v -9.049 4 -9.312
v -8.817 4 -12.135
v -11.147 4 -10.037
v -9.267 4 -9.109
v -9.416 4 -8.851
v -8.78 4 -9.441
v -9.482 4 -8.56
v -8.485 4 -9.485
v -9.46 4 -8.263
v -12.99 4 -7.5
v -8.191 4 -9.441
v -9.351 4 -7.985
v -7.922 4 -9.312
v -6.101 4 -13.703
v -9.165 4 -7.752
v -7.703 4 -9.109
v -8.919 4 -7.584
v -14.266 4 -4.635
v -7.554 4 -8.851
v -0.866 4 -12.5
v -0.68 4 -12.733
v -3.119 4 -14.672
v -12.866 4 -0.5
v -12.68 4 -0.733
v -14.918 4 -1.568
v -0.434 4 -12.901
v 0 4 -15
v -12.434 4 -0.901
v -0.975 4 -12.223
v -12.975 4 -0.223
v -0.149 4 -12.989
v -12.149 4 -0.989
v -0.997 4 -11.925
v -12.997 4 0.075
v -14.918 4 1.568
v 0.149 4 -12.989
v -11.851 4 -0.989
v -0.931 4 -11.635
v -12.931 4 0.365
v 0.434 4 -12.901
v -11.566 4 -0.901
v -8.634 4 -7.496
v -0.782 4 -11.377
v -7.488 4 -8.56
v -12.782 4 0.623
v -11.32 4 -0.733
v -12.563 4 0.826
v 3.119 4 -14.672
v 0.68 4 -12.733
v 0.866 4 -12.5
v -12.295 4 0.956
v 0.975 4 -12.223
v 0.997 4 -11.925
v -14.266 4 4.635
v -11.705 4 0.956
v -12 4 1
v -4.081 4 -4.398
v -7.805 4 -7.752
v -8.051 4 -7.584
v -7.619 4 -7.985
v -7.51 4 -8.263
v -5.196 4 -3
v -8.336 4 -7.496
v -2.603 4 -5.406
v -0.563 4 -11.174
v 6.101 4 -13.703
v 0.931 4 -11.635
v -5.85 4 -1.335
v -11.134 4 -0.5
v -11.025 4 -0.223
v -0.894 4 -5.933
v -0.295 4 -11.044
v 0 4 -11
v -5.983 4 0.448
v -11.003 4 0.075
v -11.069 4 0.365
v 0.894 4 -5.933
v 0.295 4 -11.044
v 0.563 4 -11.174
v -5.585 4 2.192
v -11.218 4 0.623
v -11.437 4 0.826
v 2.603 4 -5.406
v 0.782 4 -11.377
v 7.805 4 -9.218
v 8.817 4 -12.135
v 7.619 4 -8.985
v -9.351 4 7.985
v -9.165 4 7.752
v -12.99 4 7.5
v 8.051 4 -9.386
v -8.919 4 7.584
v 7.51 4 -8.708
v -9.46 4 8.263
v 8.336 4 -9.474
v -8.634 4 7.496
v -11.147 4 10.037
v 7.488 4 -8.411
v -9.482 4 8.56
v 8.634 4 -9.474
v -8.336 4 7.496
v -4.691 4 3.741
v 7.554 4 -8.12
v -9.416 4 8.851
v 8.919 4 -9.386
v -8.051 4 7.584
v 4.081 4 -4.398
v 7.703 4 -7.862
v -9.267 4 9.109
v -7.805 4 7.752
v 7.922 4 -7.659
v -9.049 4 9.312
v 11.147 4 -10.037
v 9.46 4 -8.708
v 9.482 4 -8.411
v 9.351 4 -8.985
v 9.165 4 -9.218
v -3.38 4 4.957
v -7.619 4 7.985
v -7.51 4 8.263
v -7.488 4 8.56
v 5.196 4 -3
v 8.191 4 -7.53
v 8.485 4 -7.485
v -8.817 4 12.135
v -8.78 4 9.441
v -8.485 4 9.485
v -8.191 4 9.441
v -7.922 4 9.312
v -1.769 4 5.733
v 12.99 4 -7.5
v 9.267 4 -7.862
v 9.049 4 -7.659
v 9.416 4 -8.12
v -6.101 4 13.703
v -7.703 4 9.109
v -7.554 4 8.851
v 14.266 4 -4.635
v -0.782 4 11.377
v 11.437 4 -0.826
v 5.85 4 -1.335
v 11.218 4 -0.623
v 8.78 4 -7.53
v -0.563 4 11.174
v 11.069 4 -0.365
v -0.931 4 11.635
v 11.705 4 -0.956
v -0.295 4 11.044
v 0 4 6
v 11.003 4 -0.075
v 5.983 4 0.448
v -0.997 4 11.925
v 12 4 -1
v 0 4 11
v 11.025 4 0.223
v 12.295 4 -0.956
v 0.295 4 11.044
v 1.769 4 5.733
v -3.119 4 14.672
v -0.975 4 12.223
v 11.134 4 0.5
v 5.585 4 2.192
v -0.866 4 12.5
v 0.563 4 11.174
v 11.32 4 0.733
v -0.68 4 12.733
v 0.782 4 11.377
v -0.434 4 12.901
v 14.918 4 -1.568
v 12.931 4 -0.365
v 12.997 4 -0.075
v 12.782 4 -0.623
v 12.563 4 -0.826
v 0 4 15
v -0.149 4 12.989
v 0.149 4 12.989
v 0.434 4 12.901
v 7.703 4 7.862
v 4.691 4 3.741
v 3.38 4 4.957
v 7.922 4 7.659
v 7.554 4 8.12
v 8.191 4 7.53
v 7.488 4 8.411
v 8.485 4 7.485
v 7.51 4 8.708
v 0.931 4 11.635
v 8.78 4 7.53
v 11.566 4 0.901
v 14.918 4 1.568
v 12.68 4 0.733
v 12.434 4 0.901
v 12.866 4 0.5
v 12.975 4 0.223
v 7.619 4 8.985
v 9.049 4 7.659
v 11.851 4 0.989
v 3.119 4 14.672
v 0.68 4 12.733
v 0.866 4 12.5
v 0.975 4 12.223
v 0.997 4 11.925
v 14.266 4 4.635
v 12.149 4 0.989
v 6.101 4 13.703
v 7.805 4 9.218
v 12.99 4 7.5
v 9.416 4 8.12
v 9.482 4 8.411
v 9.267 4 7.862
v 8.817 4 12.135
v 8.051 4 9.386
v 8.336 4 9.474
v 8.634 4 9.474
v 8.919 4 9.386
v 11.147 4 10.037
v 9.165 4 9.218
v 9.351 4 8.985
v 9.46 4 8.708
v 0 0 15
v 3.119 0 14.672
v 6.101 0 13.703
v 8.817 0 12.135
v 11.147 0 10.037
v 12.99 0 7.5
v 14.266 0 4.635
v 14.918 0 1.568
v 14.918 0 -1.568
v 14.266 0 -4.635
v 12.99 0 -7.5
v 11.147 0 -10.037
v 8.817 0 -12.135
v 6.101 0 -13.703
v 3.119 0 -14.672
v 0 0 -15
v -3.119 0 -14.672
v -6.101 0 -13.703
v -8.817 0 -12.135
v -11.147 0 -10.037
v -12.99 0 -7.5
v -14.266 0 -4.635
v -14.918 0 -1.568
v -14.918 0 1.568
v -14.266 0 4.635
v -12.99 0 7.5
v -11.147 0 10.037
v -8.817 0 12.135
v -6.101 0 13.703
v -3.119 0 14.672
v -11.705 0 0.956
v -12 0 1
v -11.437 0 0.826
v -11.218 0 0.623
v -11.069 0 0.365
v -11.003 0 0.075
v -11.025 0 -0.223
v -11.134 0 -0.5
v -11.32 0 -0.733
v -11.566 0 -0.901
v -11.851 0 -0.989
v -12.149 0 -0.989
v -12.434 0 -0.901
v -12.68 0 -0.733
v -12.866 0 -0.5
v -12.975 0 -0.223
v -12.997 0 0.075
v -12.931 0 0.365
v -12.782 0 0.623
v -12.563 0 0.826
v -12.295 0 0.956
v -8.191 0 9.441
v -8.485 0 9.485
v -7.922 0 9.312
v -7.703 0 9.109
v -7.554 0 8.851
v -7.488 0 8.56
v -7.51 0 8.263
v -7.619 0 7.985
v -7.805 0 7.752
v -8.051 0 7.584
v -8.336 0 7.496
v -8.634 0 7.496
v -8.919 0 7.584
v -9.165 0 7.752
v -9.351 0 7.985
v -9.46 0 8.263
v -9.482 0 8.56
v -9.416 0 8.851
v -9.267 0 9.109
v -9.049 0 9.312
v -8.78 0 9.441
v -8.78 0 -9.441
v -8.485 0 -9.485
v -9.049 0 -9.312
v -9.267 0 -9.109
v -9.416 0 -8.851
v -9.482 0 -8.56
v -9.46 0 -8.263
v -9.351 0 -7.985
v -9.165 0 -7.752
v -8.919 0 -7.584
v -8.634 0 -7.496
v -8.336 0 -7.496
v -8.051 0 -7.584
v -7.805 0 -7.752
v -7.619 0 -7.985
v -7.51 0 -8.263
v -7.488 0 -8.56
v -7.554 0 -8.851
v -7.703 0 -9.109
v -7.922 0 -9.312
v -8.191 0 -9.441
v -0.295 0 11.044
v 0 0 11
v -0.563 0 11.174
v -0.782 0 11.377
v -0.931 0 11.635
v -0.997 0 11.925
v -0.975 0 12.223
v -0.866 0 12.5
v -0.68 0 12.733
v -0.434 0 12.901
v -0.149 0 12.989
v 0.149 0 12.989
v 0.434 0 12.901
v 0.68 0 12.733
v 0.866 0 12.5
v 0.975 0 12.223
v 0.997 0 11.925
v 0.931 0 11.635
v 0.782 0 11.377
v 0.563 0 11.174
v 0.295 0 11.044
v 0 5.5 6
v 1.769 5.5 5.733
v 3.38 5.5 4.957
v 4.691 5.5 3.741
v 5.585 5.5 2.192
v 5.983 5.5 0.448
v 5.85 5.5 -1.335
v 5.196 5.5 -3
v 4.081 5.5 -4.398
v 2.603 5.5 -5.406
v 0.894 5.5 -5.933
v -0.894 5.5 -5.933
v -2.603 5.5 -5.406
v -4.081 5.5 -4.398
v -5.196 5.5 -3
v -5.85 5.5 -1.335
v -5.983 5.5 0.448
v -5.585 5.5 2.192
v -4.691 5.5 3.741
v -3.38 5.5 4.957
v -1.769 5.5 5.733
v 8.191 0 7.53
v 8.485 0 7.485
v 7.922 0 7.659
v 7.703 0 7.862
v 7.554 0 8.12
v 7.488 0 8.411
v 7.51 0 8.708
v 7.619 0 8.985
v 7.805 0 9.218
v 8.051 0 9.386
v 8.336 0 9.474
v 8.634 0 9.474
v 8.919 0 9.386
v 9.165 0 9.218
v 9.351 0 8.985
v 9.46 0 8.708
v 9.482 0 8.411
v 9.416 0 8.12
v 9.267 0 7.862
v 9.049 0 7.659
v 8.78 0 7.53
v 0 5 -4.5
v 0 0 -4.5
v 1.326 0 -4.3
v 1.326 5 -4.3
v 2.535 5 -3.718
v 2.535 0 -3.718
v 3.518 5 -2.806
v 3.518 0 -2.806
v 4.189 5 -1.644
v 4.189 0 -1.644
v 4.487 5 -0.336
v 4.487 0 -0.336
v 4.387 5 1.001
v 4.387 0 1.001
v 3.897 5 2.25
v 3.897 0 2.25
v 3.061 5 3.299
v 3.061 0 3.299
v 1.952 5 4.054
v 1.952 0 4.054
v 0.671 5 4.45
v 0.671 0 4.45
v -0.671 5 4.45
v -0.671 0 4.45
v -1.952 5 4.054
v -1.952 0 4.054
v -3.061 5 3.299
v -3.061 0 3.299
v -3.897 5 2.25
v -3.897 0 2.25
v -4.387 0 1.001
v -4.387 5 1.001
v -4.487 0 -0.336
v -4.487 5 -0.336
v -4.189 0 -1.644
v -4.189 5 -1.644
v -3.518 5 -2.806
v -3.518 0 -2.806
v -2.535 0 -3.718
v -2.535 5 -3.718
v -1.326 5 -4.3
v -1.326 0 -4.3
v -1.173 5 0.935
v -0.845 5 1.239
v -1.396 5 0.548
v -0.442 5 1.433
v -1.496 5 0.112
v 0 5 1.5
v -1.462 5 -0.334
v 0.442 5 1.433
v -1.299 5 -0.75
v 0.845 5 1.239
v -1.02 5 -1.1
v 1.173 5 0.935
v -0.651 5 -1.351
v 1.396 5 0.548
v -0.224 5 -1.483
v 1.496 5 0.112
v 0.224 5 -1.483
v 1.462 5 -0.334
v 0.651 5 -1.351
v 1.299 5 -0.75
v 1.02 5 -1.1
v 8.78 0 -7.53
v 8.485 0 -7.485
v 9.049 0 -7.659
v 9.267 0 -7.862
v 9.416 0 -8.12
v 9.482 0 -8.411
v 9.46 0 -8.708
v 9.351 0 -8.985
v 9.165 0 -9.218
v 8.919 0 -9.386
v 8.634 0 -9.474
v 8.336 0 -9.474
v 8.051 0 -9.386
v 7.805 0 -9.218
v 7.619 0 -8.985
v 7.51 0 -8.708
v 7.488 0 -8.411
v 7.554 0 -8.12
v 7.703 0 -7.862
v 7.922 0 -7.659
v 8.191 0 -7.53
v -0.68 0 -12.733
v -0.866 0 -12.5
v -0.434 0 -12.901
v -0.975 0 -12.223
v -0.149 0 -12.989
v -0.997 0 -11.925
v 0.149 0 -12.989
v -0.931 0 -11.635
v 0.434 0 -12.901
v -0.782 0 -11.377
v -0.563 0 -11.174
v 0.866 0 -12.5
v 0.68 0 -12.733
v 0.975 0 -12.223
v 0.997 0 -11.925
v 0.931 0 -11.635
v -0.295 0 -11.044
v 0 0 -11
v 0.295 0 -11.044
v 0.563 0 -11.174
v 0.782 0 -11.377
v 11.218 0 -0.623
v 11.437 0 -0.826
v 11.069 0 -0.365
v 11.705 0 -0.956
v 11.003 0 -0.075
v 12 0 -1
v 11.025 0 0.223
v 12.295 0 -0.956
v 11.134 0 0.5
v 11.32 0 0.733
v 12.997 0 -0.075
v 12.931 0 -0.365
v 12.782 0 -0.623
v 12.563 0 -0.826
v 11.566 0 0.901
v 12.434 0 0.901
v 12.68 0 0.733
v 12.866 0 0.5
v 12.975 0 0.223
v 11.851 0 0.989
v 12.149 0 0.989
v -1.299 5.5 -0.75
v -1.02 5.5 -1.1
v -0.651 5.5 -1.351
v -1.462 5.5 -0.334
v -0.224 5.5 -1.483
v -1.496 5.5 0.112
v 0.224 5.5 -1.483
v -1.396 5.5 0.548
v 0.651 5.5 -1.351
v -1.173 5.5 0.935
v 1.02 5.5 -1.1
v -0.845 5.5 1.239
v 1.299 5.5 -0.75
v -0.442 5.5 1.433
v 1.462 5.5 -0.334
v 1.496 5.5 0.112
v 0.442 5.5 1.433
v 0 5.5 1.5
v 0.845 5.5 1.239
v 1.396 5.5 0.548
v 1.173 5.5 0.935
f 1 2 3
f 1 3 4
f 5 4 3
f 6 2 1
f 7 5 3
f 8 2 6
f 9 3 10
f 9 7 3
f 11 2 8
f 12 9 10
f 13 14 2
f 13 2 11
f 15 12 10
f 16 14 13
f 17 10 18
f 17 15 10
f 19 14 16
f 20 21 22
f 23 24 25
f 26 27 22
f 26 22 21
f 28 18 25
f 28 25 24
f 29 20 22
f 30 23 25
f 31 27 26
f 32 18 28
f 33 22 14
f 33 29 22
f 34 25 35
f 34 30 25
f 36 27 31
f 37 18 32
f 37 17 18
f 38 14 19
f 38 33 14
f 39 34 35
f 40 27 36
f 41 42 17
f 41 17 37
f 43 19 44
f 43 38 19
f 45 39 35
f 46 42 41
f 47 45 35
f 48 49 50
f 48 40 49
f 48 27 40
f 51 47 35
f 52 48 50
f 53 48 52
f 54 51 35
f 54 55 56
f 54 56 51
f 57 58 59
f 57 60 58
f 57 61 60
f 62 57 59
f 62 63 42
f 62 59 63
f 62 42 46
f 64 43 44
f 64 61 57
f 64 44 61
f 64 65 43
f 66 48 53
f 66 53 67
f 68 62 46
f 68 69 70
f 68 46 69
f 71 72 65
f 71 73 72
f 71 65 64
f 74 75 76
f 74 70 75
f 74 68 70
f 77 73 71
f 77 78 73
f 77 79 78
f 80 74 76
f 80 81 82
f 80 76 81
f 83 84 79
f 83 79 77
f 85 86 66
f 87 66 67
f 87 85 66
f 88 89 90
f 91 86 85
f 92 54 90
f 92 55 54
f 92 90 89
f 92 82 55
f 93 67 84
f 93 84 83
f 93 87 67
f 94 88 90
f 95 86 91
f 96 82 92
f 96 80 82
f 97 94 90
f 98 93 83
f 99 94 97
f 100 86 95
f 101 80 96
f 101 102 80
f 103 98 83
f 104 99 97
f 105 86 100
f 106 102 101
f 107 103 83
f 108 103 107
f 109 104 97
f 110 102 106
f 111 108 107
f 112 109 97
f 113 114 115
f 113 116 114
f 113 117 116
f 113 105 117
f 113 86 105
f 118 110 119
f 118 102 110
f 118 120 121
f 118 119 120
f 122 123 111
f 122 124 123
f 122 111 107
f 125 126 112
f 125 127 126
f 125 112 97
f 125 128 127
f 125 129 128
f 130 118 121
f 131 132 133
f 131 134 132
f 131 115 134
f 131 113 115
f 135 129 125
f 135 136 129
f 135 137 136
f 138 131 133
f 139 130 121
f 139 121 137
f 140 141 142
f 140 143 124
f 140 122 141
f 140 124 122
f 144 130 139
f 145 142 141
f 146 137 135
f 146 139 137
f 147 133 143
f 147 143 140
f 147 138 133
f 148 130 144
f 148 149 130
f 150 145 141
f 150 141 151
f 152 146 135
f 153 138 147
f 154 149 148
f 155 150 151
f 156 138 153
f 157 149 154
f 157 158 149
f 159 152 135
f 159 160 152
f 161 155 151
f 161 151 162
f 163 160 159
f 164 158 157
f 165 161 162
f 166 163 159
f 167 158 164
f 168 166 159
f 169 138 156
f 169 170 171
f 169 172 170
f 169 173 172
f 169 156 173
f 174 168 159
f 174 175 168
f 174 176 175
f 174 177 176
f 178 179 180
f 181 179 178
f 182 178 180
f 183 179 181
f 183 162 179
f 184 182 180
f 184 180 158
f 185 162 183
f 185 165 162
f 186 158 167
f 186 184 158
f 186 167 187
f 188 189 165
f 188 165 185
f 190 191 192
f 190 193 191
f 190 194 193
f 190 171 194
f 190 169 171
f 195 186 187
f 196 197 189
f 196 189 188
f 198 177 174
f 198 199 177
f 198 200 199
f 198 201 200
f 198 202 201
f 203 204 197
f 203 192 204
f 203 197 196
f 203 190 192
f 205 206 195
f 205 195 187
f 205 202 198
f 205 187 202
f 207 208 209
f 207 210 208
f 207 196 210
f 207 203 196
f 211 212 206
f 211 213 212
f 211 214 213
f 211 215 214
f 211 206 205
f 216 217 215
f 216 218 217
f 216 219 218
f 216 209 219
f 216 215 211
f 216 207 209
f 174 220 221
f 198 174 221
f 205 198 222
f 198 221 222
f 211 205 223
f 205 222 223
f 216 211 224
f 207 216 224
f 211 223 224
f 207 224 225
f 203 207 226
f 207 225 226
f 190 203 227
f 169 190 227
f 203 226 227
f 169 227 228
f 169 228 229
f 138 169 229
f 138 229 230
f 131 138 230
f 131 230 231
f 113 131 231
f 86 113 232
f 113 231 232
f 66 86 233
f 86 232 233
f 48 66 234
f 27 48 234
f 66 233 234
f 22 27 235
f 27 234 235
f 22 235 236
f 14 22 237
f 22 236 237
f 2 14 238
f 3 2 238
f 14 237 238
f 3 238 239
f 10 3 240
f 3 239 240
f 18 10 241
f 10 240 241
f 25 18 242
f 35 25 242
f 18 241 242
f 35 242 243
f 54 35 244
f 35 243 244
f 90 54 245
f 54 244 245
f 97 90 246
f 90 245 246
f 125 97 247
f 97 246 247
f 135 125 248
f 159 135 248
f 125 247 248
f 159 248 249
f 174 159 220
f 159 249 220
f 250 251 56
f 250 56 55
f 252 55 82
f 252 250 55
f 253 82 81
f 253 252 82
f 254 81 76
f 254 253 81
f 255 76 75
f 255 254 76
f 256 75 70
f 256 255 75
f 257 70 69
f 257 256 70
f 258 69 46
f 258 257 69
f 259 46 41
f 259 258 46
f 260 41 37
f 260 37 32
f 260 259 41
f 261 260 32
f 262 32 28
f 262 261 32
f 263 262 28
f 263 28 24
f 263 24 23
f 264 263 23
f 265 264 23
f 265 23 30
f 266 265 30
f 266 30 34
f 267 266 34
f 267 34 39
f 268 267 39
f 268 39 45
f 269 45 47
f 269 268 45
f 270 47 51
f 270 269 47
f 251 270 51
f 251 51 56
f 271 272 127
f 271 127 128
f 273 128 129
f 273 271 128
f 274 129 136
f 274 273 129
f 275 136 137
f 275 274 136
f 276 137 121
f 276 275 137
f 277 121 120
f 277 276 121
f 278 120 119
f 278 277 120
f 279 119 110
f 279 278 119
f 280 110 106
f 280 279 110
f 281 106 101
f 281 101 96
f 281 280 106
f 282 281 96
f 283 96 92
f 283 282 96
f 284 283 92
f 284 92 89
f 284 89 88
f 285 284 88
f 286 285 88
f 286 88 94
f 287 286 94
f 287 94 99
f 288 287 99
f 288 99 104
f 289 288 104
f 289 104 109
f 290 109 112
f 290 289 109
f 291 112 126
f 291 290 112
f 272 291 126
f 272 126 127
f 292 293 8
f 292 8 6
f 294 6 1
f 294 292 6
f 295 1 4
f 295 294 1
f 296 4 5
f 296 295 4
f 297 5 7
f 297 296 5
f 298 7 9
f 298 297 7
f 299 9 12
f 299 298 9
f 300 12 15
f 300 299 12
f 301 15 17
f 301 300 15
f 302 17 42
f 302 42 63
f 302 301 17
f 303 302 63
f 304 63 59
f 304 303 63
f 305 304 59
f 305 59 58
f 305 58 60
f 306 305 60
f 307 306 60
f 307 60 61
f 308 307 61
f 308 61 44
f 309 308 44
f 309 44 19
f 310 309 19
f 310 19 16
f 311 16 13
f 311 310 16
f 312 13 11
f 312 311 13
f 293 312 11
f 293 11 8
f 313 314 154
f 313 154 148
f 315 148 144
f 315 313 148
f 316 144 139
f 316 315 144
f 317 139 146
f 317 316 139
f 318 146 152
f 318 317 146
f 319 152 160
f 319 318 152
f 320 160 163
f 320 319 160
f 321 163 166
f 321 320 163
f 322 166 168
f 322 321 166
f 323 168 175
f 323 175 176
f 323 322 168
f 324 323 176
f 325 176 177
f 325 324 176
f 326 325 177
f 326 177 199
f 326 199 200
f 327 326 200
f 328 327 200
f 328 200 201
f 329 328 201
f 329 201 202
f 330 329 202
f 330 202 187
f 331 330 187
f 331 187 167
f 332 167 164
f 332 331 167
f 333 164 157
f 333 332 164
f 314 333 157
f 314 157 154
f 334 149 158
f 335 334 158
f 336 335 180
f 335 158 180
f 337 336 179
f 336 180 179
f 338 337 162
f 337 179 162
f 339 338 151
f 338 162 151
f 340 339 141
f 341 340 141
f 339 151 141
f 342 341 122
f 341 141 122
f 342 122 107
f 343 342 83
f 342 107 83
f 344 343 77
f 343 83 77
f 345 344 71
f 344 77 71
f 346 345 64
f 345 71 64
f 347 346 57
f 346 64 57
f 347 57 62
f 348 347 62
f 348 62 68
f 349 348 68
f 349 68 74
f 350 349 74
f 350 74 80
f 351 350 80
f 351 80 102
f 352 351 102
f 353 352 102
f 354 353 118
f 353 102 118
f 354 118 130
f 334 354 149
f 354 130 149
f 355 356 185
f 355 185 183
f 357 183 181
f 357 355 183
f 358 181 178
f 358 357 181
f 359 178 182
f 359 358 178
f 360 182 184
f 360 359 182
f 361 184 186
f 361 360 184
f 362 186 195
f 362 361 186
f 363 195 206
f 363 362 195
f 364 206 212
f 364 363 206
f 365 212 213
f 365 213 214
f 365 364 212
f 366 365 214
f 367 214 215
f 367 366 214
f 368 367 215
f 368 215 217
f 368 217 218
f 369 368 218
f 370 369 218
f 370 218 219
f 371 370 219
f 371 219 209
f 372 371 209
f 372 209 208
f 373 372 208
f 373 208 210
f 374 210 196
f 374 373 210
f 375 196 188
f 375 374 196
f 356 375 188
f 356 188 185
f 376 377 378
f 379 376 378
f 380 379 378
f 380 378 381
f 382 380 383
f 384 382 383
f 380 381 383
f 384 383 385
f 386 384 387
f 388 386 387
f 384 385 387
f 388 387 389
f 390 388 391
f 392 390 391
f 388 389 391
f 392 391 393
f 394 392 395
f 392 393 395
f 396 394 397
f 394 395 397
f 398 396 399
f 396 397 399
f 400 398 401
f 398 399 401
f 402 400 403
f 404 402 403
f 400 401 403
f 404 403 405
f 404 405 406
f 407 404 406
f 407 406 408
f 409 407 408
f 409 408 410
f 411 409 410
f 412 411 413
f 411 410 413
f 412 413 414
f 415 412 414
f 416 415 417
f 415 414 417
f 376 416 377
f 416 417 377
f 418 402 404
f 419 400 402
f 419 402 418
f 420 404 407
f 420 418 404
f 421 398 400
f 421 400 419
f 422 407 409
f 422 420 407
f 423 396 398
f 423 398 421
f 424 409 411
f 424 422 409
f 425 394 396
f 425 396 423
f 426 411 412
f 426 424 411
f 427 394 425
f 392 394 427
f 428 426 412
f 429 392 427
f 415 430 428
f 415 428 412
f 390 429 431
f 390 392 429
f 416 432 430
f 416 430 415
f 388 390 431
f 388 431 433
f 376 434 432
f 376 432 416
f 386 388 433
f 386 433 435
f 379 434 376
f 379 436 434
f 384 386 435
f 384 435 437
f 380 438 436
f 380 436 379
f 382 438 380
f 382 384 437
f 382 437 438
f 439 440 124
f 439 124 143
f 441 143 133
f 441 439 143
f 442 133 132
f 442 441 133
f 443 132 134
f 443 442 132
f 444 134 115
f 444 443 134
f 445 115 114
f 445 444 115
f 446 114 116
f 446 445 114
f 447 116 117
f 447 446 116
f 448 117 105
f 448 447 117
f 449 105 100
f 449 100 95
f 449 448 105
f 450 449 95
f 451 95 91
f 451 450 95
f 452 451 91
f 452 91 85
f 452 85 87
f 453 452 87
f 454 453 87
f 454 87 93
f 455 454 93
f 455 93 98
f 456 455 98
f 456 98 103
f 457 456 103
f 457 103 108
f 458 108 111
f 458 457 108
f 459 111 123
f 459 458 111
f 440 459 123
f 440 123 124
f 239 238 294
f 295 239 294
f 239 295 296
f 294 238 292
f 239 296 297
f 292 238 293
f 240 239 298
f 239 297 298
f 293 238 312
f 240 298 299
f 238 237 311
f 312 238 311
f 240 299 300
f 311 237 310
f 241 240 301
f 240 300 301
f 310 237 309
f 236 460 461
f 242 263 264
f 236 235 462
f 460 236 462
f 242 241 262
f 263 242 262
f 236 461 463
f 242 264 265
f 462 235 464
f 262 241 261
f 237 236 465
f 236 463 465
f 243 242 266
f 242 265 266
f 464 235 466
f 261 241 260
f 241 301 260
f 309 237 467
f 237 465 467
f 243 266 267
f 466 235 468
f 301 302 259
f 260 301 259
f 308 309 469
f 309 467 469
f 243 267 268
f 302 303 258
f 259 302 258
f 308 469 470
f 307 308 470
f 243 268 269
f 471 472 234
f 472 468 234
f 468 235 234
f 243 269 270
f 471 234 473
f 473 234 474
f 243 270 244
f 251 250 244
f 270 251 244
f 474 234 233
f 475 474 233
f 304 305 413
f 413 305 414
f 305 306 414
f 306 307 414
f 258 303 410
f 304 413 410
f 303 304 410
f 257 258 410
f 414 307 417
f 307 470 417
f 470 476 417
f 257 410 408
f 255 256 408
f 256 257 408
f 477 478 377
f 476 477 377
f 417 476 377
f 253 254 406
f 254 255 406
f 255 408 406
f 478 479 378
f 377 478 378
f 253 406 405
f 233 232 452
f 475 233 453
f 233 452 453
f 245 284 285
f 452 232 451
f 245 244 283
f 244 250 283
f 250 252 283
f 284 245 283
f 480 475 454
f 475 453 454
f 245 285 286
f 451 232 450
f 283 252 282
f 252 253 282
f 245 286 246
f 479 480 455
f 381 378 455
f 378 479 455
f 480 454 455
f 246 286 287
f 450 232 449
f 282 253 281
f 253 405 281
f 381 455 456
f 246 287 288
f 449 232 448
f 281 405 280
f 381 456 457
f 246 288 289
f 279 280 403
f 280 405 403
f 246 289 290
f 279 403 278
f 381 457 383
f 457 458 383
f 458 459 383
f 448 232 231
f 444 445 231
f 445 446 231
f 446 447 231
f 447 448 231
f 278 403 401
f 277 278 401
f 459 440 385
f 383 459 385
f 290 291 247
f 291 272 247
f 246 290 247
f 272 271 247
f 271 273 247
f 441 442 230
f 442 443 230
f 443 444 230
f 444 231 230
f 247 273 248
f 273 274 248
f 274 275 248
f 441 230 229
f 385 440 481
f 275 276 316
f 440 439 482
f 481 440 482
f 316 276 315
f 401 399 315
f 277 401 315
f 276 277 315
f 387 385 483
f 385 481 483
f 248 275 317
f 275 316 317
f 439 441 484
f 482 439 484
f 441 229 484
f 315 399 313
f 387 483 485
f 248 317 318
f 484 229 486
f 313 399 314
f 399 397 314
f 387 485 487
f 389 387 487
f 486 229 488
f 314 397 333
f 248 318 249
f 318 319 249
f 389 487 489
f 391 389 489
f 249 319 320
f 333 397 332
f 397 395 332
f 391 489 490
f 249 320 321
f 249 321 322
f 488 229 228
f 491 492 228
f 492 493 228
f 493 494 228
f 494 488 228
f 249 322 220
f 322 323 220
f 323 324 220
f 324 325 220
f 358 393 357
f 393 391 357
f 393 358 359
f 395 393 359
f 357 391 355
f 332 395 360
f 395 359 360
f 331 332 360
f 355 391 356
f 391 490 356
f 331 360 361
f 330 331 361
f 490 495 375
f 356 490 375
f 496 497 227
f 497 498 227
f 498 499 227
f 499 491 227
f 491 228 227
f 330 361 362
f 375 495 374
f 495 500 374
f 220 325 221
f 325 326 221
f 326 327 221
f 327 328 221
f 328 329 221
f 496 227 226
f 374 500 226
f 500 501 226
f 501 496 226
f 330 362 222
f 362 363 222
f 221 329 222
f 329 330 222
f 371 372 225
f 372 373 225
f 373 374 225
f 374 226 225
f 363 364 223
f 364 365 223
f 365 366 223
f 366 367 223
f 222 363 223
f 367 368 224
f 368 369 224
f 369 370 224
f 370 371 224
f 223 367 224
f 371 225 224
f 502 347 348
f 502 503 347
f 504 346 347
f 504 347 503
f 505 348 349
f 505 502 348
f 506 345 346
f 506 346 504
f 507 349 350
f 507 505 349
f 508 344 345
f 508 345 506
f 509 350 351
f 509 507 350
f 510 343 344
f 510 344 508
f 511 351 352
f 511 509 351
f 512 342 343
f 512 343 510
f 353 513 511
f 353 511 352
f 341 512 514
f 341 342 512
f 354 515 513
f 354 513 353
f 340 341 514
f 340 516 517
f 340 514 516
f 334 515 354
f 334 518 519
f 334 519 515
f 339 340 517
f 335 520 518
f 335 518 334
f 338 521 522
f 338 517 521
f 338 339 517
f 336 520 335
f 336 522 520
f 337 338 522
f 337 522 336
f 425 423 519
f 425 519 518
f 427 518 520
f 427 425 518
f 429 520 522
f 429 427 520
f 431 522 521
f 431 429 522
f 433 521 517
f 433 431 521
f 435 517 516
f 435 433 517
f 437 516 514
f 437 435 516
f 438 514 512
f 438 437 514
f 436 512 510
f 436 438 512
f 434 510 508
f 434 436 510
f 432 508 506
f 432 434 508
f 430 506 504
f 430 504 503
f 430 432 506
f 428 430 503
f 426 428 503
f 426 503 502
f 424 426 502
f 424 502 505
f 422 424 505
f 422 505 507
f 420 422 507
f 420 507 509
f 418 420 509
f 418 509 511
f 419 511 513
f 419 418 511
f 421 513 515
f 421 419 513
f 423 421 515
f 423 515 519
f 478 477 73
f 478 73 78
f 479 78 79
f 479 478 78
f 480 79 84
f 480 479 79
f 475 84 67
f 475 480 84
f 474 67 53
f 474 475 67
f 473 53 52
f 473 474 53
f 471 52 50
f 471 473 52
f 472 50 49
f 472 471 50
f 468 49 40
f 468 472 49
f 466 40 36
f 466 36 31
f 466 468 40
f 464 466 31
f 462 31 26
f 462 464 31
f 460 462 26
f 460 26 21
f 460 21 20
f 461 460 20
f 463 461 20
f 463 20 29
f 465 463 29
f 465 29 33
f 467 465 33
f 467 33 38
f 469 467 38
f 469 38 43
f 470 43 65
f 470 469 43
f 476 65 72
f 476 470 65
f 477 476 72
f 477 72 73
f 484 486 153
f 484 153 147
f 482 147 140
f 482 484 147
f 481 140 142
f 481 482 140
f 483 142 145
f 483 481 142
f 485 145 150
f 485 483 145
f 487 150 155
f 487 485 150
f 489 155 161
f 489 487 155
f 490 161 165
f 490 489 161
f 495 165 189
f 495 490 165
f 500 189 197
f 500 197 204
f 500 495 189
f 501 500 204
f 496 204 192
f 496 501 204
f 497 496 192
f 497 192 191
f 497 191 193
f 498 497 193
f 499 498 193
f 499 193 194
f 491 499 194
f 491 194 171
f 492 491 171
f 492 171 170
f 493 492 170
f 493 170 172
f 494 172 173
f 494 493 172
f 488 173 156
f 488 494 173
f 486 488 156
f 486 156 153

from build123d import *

# Parameters (mm, degrees)
SKETCH_1_R          = 15
SKETCH_1_R_2        = 1
SKETCH_1_R_3        = 1.5
EXTRUDE_1_DEPTH     = 4
SKETCH_2_R          = 6
SKETCH_2_R_2        = 1.5
EXTRUDE_2_DEPTH     = 1.5
SKETCH_3_R          = 4.5
CUT_EXTRUDE_1_DEPTH = 5


with BuildPart() as part:
    # 草图1 → 凸台-拉伸1 (new body)
    with BuildSketch(Plane(origin=(0, 0, 0), x_dir=(1, 0, 0), z_dir=(0, 1, 0))):
        with Locations(Location((0, 0, 0), (0, 0, 270))):
            Circle(SKETCH_1_R)
        with Locations(Location((0, 12, 0), (0, 0, 270))):
            Circle(SKETCH_1_R_2, mode=Mode.SUBTRACT)
        with Locations(Location((8.485281374, 8.485281374, 0), (0, 0, 270))):
            Circle(SKETCH_1_R_2, mode=Mode.SUBTRACT)
        with Locations(Location((8.485281374, -8.485281374, 0), (0, 0, 90))):
            Circle(SKETCH_1_R_2, mode=Mode.SUBTRACT)
        with Locations(Location((0, -12, 0), (0, 0, 90))):
            Circle(SKETCH_1_R_2, mode=Mode.SUBTRACT)
        with Locations(Location((-8.485281374, -8.485281374, 0), (0, 0, 270))):
            Circle(SKETCH_1_R_2, mode=Mode.SUBTRACT)
        with Locations(Location((-8.485281374, 8.485281374, 0), (0, 0, 90))):
            Circle(SKETCH_1_R_2, mode=Mode.SUBTRACT)
        with Locations(Location((-12, 0, 0), (0, 0, 270))):
            Circle(SKETCH_1_R_2, mode=Mode.SUBTRACT)
        with Locations(Location((12, 0, 0), (0, 0, 90))):
            Circle(SKETCH_1_R_2, mode=Mode.SUBTRACT)
        with Locations(Location((0, 0, 0), (0, 0, 270))):
            Circle(SKETCH_1_R_3, mode=Mode.SUBTRACT)
    extrude(amount=EXTRUDE_1_DEPTH)

    # 草图2 → 凸台-拉伸2 (add)
    with BuildSketch(Plane(origin=(0, 4, 0), x_dir=(1, 0, 0), z_dir=(0, 1, 0))):
        with Locations(Location((0, 0, 0), (0, 0, 270))):
            Circle(SKETCH_2_R)
        with Locations(Location((0, 0, 0), (0, 0, 270))):
            Circle(SKETCH_2_R_2, mode=Mode.SUBTRACT)
    extrude(amount=EXTRUDE_2_DEPTH)

    # 草图3 → 切除-拉伸1 (cut)
    with BuildSketch(Plane.XZ):
        with Locations(Location((0, 0, 0), (0, 0, 270))):
            Circle(SKETCH_3_R)
    extrude(amount=-CUT_EXTRUDE_1_DEPTH, mode=Mode.SUBTRACT)


solid = part.part
